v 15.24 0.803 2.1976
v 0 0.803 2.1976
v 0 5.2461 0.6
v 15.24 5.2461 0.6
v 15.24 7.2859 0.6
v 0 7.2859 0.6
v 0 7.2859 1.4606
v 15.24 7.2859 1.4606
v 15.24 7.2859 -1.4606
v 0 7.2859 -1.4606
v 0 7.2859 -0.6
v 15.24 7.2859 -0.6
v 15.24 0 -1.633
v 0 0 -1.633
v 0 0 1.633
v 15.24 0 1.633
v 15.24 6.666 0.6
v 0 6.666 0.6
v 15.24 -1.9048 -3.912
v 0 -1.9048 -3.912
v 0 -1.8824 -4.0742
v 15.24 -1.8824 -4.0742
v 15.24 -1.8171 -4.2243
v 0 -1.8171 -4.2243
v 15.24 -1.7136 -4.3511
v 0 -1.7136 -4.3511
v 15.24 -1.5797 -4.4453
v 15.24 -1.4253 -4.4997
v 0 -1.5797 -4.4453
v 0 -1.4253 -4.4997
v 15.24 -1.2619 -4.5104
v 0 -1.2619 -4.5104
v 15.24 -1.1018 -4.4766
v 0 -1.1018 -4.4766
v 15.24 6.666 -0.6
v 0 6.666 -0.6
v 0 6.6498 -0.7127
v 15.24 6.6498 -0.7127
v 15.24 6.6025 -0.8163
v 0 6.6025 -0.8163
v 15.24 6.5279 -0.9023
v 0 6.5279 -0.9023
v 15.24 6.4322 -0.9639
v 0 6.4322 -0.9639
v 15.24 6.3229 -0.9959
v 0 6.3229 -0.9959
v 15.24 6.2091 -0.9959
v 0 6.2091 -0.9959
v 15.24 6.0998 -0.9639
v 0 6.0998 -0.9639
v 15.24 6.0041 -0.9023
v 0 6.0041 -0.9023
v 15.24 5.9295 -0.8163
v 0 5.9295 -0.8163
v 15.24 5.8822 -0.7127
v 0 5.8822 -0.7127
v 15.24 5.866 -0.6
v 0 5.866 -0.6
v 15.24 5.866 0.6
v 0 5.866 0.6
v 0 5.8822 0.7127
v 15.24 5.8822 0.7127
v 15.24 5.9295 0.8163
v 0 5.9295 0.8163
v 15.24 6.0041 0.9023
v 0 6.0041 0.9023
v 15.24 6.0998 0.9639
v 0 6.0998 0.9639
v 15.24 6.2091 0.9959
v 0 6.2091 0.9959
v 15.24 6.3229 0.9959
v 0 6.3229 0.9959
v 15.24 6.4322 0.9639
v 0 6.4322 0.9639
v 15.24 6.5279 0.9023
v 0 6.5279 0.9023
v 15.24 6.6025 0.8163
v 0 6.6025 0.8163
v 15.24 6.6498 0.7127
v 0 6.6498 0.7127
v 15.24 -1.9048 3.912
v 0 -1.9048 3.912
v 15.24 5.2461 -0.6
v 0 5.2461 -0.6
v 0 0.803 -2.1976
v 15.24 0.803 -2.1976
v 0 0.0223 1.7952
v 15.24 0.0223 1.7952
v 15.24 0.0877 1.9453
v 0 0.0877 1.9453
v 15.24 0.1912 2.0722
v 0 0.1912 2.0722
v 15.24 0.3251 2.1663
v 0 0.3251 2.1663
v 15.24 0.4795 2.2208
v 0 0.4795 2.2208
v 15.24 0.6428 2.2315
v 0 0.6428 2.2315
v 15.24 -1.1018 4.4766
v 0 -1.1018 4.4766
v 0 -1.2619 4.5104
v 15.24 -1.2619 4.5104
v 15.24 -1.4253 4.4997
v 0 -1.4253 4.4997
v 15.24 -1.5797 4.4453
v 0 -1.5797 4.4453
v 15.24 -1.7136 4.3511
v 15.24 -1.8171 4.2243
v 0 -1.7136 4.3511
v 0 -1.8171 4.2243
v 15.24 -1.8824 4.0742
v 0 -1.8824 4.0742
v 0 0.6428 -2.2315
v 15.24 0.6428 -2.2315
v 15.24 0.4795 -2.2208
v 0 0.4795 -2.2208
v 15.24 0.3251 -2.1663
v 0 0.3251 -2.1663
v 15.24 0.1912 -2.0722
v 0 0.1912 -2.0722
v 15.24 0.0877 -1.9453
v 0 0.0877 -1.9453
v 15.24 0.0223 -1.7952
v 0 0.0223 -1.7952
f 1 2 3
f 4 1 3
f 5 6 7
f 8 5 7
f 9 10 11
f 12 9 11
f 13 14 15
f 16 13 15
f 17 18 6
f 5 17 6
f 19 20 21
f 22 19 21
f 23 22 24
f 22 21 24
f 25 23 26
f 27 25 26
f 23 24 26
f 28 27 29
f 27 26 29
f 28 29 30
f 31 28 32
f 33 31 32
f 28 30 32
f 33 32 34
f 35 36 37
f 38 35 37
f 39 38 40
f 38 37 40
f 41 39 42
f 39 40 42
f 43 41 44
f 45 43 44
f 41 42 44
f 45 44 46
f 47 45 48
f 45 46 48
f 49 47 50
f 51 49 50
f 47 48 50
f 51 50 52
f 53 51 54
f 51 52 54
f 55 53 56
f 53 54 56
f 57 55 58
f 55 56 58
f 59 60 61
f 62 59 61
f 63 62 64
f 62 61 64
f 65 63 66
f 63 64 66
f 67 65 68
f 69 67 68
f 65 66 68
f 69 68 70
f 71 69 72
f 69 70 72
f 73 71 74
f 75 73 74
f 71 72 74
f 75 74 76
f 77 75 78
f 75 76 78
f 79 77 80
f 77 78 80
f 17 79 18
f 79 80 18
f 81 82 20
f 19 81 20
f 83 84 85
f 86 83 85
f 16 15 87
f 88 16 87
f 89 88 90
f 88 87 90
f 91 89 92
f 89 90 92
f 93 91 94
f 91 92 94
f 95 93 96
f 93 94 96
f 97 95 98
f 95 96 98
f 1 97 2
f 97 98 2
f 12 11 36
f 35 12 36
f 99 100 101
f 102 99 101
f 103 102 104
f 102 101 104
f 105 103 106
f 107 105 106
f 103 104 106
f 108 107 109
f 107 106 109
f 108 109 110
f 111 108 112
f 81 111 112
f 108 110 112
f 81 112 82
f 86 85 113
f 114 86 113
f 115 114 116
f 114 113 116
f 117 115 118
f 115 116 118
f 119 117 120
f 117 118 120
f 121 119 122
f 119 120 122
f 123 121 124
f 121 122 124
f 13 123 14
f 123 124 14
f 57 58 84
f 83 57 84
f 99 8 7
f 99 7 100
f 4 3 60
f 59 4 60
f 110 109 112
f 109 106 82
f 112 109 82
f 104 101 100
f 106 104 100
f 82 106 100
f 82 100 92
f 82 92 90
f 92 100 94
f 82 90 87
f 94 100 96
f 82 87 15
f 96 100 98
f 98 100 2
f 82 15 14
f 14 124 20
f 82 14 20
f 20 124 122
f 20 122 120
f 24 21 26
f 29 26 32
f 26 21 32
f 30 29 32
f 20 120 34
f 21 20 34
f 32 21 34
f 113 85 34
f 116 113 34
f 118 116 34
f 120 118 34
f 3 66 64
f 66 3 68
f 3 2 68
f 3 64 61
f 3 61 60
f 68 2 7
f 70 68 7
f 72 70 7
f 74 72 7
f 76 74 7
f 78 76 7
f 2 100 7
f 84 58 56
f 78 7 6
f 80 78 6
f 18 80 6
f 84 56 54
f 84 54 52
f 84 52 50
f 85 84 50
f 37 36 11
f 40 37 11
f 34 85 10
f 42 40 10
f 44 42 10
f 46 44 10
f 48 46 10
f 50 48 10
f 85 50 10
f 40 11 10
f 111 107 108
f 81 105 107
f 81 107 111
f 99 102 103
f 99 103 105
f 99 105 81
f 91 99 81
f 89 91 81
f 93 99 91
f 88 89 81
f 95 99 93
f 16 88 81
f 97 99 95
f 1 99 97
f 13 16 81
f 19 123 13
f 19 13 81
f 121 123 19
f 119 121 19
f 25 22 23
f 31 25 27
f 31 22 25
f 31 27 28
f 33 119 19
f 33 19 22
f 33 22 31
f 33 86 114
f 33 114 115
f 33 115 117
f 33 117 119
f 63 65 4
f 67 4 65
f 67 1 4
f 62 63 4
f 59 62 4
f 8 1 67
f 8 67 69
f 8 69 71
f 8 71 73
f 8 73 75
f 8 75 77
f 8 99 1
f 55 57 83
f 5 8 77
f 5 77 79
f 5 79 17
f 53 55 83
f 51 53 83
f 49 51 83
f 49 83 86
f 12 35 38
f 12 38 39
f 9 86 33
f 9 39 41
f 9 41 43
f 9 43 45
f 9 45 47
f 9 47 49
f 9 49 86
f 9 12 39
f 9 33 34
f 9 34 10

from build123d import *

# Parameters (mm, degrees)
BOSS_EXTRUDE1_DEPTH = 15.24


with BuildPart() as part:
    # Sketch1 → Boss-Extrude1 (new body)
    with BuildSketch(Plane(origin=(0, 0, 0), x_dir=(0, 0, -1), z_dir=(1, 0, 0))):
        with BuildLine():
            Line((-0.6, 6.665999974), (-0.6, 7.285861192))
            Line((-0.6, 7.285861192), (-1.46058835, 7.285861192))
            Line((-1.46058835, 7.285861192), (-4.476578637, -1.101757214))
            ThreePointArc((-4.476578637, -1.101757214), (-4.402791775, -1.649877187), (-3.911970022, -1.904777192))
            Line((-3.911970022, -1.904777192), (3.911970022, -1.904777192))
            ThreePointArc((3.911970022, -1.904777192), (4.402791775, -1.649877187), (4.476578637, -1.101757214))
            Line((4.476578637, -1.101757214), (1.46058835, 7.285861192))
            Line((1.46058835, 7.285861192), (0.6, 7.285861192))
            Line((0.6, 7.285861192), (0.6, 6.665999974))
            ThreePointArc((0.6, 6.665999974), (1, 6.265999974), (0.6, 5.865999974))
            Line((0.6, 5.865999974), (0.6, 5.246138756))
            Line((0.6, 5.246138756), (2.197641003, 0.803019978))
            ThreePointArc((2.197641003, 0.803019978), (2.12385414, 0.254900005), (1.633032387, 0))
            Line((1.633032387, 0), (0, 0))
            Line((0, 0), (-1.633032387, 0))
            ThreePointArc((-1.633032387, 0), (-2.12385414, 0.254900005), (-2.197641003, 0.803019978))
            Line((-2.197641003, 0.803019978), (-0.6, 5.246138756))
            Line((-0.6, 5.246138756), (-0.6, 5.865999974))
            ThreePointArc((-0.6, 5.865999974), (-1, 6.265999974), (-0.6, 6.665999974))
        make_face()
    extrude(amount=BOSS_EXTRUDE1_DEPTH)


solid = part.part
